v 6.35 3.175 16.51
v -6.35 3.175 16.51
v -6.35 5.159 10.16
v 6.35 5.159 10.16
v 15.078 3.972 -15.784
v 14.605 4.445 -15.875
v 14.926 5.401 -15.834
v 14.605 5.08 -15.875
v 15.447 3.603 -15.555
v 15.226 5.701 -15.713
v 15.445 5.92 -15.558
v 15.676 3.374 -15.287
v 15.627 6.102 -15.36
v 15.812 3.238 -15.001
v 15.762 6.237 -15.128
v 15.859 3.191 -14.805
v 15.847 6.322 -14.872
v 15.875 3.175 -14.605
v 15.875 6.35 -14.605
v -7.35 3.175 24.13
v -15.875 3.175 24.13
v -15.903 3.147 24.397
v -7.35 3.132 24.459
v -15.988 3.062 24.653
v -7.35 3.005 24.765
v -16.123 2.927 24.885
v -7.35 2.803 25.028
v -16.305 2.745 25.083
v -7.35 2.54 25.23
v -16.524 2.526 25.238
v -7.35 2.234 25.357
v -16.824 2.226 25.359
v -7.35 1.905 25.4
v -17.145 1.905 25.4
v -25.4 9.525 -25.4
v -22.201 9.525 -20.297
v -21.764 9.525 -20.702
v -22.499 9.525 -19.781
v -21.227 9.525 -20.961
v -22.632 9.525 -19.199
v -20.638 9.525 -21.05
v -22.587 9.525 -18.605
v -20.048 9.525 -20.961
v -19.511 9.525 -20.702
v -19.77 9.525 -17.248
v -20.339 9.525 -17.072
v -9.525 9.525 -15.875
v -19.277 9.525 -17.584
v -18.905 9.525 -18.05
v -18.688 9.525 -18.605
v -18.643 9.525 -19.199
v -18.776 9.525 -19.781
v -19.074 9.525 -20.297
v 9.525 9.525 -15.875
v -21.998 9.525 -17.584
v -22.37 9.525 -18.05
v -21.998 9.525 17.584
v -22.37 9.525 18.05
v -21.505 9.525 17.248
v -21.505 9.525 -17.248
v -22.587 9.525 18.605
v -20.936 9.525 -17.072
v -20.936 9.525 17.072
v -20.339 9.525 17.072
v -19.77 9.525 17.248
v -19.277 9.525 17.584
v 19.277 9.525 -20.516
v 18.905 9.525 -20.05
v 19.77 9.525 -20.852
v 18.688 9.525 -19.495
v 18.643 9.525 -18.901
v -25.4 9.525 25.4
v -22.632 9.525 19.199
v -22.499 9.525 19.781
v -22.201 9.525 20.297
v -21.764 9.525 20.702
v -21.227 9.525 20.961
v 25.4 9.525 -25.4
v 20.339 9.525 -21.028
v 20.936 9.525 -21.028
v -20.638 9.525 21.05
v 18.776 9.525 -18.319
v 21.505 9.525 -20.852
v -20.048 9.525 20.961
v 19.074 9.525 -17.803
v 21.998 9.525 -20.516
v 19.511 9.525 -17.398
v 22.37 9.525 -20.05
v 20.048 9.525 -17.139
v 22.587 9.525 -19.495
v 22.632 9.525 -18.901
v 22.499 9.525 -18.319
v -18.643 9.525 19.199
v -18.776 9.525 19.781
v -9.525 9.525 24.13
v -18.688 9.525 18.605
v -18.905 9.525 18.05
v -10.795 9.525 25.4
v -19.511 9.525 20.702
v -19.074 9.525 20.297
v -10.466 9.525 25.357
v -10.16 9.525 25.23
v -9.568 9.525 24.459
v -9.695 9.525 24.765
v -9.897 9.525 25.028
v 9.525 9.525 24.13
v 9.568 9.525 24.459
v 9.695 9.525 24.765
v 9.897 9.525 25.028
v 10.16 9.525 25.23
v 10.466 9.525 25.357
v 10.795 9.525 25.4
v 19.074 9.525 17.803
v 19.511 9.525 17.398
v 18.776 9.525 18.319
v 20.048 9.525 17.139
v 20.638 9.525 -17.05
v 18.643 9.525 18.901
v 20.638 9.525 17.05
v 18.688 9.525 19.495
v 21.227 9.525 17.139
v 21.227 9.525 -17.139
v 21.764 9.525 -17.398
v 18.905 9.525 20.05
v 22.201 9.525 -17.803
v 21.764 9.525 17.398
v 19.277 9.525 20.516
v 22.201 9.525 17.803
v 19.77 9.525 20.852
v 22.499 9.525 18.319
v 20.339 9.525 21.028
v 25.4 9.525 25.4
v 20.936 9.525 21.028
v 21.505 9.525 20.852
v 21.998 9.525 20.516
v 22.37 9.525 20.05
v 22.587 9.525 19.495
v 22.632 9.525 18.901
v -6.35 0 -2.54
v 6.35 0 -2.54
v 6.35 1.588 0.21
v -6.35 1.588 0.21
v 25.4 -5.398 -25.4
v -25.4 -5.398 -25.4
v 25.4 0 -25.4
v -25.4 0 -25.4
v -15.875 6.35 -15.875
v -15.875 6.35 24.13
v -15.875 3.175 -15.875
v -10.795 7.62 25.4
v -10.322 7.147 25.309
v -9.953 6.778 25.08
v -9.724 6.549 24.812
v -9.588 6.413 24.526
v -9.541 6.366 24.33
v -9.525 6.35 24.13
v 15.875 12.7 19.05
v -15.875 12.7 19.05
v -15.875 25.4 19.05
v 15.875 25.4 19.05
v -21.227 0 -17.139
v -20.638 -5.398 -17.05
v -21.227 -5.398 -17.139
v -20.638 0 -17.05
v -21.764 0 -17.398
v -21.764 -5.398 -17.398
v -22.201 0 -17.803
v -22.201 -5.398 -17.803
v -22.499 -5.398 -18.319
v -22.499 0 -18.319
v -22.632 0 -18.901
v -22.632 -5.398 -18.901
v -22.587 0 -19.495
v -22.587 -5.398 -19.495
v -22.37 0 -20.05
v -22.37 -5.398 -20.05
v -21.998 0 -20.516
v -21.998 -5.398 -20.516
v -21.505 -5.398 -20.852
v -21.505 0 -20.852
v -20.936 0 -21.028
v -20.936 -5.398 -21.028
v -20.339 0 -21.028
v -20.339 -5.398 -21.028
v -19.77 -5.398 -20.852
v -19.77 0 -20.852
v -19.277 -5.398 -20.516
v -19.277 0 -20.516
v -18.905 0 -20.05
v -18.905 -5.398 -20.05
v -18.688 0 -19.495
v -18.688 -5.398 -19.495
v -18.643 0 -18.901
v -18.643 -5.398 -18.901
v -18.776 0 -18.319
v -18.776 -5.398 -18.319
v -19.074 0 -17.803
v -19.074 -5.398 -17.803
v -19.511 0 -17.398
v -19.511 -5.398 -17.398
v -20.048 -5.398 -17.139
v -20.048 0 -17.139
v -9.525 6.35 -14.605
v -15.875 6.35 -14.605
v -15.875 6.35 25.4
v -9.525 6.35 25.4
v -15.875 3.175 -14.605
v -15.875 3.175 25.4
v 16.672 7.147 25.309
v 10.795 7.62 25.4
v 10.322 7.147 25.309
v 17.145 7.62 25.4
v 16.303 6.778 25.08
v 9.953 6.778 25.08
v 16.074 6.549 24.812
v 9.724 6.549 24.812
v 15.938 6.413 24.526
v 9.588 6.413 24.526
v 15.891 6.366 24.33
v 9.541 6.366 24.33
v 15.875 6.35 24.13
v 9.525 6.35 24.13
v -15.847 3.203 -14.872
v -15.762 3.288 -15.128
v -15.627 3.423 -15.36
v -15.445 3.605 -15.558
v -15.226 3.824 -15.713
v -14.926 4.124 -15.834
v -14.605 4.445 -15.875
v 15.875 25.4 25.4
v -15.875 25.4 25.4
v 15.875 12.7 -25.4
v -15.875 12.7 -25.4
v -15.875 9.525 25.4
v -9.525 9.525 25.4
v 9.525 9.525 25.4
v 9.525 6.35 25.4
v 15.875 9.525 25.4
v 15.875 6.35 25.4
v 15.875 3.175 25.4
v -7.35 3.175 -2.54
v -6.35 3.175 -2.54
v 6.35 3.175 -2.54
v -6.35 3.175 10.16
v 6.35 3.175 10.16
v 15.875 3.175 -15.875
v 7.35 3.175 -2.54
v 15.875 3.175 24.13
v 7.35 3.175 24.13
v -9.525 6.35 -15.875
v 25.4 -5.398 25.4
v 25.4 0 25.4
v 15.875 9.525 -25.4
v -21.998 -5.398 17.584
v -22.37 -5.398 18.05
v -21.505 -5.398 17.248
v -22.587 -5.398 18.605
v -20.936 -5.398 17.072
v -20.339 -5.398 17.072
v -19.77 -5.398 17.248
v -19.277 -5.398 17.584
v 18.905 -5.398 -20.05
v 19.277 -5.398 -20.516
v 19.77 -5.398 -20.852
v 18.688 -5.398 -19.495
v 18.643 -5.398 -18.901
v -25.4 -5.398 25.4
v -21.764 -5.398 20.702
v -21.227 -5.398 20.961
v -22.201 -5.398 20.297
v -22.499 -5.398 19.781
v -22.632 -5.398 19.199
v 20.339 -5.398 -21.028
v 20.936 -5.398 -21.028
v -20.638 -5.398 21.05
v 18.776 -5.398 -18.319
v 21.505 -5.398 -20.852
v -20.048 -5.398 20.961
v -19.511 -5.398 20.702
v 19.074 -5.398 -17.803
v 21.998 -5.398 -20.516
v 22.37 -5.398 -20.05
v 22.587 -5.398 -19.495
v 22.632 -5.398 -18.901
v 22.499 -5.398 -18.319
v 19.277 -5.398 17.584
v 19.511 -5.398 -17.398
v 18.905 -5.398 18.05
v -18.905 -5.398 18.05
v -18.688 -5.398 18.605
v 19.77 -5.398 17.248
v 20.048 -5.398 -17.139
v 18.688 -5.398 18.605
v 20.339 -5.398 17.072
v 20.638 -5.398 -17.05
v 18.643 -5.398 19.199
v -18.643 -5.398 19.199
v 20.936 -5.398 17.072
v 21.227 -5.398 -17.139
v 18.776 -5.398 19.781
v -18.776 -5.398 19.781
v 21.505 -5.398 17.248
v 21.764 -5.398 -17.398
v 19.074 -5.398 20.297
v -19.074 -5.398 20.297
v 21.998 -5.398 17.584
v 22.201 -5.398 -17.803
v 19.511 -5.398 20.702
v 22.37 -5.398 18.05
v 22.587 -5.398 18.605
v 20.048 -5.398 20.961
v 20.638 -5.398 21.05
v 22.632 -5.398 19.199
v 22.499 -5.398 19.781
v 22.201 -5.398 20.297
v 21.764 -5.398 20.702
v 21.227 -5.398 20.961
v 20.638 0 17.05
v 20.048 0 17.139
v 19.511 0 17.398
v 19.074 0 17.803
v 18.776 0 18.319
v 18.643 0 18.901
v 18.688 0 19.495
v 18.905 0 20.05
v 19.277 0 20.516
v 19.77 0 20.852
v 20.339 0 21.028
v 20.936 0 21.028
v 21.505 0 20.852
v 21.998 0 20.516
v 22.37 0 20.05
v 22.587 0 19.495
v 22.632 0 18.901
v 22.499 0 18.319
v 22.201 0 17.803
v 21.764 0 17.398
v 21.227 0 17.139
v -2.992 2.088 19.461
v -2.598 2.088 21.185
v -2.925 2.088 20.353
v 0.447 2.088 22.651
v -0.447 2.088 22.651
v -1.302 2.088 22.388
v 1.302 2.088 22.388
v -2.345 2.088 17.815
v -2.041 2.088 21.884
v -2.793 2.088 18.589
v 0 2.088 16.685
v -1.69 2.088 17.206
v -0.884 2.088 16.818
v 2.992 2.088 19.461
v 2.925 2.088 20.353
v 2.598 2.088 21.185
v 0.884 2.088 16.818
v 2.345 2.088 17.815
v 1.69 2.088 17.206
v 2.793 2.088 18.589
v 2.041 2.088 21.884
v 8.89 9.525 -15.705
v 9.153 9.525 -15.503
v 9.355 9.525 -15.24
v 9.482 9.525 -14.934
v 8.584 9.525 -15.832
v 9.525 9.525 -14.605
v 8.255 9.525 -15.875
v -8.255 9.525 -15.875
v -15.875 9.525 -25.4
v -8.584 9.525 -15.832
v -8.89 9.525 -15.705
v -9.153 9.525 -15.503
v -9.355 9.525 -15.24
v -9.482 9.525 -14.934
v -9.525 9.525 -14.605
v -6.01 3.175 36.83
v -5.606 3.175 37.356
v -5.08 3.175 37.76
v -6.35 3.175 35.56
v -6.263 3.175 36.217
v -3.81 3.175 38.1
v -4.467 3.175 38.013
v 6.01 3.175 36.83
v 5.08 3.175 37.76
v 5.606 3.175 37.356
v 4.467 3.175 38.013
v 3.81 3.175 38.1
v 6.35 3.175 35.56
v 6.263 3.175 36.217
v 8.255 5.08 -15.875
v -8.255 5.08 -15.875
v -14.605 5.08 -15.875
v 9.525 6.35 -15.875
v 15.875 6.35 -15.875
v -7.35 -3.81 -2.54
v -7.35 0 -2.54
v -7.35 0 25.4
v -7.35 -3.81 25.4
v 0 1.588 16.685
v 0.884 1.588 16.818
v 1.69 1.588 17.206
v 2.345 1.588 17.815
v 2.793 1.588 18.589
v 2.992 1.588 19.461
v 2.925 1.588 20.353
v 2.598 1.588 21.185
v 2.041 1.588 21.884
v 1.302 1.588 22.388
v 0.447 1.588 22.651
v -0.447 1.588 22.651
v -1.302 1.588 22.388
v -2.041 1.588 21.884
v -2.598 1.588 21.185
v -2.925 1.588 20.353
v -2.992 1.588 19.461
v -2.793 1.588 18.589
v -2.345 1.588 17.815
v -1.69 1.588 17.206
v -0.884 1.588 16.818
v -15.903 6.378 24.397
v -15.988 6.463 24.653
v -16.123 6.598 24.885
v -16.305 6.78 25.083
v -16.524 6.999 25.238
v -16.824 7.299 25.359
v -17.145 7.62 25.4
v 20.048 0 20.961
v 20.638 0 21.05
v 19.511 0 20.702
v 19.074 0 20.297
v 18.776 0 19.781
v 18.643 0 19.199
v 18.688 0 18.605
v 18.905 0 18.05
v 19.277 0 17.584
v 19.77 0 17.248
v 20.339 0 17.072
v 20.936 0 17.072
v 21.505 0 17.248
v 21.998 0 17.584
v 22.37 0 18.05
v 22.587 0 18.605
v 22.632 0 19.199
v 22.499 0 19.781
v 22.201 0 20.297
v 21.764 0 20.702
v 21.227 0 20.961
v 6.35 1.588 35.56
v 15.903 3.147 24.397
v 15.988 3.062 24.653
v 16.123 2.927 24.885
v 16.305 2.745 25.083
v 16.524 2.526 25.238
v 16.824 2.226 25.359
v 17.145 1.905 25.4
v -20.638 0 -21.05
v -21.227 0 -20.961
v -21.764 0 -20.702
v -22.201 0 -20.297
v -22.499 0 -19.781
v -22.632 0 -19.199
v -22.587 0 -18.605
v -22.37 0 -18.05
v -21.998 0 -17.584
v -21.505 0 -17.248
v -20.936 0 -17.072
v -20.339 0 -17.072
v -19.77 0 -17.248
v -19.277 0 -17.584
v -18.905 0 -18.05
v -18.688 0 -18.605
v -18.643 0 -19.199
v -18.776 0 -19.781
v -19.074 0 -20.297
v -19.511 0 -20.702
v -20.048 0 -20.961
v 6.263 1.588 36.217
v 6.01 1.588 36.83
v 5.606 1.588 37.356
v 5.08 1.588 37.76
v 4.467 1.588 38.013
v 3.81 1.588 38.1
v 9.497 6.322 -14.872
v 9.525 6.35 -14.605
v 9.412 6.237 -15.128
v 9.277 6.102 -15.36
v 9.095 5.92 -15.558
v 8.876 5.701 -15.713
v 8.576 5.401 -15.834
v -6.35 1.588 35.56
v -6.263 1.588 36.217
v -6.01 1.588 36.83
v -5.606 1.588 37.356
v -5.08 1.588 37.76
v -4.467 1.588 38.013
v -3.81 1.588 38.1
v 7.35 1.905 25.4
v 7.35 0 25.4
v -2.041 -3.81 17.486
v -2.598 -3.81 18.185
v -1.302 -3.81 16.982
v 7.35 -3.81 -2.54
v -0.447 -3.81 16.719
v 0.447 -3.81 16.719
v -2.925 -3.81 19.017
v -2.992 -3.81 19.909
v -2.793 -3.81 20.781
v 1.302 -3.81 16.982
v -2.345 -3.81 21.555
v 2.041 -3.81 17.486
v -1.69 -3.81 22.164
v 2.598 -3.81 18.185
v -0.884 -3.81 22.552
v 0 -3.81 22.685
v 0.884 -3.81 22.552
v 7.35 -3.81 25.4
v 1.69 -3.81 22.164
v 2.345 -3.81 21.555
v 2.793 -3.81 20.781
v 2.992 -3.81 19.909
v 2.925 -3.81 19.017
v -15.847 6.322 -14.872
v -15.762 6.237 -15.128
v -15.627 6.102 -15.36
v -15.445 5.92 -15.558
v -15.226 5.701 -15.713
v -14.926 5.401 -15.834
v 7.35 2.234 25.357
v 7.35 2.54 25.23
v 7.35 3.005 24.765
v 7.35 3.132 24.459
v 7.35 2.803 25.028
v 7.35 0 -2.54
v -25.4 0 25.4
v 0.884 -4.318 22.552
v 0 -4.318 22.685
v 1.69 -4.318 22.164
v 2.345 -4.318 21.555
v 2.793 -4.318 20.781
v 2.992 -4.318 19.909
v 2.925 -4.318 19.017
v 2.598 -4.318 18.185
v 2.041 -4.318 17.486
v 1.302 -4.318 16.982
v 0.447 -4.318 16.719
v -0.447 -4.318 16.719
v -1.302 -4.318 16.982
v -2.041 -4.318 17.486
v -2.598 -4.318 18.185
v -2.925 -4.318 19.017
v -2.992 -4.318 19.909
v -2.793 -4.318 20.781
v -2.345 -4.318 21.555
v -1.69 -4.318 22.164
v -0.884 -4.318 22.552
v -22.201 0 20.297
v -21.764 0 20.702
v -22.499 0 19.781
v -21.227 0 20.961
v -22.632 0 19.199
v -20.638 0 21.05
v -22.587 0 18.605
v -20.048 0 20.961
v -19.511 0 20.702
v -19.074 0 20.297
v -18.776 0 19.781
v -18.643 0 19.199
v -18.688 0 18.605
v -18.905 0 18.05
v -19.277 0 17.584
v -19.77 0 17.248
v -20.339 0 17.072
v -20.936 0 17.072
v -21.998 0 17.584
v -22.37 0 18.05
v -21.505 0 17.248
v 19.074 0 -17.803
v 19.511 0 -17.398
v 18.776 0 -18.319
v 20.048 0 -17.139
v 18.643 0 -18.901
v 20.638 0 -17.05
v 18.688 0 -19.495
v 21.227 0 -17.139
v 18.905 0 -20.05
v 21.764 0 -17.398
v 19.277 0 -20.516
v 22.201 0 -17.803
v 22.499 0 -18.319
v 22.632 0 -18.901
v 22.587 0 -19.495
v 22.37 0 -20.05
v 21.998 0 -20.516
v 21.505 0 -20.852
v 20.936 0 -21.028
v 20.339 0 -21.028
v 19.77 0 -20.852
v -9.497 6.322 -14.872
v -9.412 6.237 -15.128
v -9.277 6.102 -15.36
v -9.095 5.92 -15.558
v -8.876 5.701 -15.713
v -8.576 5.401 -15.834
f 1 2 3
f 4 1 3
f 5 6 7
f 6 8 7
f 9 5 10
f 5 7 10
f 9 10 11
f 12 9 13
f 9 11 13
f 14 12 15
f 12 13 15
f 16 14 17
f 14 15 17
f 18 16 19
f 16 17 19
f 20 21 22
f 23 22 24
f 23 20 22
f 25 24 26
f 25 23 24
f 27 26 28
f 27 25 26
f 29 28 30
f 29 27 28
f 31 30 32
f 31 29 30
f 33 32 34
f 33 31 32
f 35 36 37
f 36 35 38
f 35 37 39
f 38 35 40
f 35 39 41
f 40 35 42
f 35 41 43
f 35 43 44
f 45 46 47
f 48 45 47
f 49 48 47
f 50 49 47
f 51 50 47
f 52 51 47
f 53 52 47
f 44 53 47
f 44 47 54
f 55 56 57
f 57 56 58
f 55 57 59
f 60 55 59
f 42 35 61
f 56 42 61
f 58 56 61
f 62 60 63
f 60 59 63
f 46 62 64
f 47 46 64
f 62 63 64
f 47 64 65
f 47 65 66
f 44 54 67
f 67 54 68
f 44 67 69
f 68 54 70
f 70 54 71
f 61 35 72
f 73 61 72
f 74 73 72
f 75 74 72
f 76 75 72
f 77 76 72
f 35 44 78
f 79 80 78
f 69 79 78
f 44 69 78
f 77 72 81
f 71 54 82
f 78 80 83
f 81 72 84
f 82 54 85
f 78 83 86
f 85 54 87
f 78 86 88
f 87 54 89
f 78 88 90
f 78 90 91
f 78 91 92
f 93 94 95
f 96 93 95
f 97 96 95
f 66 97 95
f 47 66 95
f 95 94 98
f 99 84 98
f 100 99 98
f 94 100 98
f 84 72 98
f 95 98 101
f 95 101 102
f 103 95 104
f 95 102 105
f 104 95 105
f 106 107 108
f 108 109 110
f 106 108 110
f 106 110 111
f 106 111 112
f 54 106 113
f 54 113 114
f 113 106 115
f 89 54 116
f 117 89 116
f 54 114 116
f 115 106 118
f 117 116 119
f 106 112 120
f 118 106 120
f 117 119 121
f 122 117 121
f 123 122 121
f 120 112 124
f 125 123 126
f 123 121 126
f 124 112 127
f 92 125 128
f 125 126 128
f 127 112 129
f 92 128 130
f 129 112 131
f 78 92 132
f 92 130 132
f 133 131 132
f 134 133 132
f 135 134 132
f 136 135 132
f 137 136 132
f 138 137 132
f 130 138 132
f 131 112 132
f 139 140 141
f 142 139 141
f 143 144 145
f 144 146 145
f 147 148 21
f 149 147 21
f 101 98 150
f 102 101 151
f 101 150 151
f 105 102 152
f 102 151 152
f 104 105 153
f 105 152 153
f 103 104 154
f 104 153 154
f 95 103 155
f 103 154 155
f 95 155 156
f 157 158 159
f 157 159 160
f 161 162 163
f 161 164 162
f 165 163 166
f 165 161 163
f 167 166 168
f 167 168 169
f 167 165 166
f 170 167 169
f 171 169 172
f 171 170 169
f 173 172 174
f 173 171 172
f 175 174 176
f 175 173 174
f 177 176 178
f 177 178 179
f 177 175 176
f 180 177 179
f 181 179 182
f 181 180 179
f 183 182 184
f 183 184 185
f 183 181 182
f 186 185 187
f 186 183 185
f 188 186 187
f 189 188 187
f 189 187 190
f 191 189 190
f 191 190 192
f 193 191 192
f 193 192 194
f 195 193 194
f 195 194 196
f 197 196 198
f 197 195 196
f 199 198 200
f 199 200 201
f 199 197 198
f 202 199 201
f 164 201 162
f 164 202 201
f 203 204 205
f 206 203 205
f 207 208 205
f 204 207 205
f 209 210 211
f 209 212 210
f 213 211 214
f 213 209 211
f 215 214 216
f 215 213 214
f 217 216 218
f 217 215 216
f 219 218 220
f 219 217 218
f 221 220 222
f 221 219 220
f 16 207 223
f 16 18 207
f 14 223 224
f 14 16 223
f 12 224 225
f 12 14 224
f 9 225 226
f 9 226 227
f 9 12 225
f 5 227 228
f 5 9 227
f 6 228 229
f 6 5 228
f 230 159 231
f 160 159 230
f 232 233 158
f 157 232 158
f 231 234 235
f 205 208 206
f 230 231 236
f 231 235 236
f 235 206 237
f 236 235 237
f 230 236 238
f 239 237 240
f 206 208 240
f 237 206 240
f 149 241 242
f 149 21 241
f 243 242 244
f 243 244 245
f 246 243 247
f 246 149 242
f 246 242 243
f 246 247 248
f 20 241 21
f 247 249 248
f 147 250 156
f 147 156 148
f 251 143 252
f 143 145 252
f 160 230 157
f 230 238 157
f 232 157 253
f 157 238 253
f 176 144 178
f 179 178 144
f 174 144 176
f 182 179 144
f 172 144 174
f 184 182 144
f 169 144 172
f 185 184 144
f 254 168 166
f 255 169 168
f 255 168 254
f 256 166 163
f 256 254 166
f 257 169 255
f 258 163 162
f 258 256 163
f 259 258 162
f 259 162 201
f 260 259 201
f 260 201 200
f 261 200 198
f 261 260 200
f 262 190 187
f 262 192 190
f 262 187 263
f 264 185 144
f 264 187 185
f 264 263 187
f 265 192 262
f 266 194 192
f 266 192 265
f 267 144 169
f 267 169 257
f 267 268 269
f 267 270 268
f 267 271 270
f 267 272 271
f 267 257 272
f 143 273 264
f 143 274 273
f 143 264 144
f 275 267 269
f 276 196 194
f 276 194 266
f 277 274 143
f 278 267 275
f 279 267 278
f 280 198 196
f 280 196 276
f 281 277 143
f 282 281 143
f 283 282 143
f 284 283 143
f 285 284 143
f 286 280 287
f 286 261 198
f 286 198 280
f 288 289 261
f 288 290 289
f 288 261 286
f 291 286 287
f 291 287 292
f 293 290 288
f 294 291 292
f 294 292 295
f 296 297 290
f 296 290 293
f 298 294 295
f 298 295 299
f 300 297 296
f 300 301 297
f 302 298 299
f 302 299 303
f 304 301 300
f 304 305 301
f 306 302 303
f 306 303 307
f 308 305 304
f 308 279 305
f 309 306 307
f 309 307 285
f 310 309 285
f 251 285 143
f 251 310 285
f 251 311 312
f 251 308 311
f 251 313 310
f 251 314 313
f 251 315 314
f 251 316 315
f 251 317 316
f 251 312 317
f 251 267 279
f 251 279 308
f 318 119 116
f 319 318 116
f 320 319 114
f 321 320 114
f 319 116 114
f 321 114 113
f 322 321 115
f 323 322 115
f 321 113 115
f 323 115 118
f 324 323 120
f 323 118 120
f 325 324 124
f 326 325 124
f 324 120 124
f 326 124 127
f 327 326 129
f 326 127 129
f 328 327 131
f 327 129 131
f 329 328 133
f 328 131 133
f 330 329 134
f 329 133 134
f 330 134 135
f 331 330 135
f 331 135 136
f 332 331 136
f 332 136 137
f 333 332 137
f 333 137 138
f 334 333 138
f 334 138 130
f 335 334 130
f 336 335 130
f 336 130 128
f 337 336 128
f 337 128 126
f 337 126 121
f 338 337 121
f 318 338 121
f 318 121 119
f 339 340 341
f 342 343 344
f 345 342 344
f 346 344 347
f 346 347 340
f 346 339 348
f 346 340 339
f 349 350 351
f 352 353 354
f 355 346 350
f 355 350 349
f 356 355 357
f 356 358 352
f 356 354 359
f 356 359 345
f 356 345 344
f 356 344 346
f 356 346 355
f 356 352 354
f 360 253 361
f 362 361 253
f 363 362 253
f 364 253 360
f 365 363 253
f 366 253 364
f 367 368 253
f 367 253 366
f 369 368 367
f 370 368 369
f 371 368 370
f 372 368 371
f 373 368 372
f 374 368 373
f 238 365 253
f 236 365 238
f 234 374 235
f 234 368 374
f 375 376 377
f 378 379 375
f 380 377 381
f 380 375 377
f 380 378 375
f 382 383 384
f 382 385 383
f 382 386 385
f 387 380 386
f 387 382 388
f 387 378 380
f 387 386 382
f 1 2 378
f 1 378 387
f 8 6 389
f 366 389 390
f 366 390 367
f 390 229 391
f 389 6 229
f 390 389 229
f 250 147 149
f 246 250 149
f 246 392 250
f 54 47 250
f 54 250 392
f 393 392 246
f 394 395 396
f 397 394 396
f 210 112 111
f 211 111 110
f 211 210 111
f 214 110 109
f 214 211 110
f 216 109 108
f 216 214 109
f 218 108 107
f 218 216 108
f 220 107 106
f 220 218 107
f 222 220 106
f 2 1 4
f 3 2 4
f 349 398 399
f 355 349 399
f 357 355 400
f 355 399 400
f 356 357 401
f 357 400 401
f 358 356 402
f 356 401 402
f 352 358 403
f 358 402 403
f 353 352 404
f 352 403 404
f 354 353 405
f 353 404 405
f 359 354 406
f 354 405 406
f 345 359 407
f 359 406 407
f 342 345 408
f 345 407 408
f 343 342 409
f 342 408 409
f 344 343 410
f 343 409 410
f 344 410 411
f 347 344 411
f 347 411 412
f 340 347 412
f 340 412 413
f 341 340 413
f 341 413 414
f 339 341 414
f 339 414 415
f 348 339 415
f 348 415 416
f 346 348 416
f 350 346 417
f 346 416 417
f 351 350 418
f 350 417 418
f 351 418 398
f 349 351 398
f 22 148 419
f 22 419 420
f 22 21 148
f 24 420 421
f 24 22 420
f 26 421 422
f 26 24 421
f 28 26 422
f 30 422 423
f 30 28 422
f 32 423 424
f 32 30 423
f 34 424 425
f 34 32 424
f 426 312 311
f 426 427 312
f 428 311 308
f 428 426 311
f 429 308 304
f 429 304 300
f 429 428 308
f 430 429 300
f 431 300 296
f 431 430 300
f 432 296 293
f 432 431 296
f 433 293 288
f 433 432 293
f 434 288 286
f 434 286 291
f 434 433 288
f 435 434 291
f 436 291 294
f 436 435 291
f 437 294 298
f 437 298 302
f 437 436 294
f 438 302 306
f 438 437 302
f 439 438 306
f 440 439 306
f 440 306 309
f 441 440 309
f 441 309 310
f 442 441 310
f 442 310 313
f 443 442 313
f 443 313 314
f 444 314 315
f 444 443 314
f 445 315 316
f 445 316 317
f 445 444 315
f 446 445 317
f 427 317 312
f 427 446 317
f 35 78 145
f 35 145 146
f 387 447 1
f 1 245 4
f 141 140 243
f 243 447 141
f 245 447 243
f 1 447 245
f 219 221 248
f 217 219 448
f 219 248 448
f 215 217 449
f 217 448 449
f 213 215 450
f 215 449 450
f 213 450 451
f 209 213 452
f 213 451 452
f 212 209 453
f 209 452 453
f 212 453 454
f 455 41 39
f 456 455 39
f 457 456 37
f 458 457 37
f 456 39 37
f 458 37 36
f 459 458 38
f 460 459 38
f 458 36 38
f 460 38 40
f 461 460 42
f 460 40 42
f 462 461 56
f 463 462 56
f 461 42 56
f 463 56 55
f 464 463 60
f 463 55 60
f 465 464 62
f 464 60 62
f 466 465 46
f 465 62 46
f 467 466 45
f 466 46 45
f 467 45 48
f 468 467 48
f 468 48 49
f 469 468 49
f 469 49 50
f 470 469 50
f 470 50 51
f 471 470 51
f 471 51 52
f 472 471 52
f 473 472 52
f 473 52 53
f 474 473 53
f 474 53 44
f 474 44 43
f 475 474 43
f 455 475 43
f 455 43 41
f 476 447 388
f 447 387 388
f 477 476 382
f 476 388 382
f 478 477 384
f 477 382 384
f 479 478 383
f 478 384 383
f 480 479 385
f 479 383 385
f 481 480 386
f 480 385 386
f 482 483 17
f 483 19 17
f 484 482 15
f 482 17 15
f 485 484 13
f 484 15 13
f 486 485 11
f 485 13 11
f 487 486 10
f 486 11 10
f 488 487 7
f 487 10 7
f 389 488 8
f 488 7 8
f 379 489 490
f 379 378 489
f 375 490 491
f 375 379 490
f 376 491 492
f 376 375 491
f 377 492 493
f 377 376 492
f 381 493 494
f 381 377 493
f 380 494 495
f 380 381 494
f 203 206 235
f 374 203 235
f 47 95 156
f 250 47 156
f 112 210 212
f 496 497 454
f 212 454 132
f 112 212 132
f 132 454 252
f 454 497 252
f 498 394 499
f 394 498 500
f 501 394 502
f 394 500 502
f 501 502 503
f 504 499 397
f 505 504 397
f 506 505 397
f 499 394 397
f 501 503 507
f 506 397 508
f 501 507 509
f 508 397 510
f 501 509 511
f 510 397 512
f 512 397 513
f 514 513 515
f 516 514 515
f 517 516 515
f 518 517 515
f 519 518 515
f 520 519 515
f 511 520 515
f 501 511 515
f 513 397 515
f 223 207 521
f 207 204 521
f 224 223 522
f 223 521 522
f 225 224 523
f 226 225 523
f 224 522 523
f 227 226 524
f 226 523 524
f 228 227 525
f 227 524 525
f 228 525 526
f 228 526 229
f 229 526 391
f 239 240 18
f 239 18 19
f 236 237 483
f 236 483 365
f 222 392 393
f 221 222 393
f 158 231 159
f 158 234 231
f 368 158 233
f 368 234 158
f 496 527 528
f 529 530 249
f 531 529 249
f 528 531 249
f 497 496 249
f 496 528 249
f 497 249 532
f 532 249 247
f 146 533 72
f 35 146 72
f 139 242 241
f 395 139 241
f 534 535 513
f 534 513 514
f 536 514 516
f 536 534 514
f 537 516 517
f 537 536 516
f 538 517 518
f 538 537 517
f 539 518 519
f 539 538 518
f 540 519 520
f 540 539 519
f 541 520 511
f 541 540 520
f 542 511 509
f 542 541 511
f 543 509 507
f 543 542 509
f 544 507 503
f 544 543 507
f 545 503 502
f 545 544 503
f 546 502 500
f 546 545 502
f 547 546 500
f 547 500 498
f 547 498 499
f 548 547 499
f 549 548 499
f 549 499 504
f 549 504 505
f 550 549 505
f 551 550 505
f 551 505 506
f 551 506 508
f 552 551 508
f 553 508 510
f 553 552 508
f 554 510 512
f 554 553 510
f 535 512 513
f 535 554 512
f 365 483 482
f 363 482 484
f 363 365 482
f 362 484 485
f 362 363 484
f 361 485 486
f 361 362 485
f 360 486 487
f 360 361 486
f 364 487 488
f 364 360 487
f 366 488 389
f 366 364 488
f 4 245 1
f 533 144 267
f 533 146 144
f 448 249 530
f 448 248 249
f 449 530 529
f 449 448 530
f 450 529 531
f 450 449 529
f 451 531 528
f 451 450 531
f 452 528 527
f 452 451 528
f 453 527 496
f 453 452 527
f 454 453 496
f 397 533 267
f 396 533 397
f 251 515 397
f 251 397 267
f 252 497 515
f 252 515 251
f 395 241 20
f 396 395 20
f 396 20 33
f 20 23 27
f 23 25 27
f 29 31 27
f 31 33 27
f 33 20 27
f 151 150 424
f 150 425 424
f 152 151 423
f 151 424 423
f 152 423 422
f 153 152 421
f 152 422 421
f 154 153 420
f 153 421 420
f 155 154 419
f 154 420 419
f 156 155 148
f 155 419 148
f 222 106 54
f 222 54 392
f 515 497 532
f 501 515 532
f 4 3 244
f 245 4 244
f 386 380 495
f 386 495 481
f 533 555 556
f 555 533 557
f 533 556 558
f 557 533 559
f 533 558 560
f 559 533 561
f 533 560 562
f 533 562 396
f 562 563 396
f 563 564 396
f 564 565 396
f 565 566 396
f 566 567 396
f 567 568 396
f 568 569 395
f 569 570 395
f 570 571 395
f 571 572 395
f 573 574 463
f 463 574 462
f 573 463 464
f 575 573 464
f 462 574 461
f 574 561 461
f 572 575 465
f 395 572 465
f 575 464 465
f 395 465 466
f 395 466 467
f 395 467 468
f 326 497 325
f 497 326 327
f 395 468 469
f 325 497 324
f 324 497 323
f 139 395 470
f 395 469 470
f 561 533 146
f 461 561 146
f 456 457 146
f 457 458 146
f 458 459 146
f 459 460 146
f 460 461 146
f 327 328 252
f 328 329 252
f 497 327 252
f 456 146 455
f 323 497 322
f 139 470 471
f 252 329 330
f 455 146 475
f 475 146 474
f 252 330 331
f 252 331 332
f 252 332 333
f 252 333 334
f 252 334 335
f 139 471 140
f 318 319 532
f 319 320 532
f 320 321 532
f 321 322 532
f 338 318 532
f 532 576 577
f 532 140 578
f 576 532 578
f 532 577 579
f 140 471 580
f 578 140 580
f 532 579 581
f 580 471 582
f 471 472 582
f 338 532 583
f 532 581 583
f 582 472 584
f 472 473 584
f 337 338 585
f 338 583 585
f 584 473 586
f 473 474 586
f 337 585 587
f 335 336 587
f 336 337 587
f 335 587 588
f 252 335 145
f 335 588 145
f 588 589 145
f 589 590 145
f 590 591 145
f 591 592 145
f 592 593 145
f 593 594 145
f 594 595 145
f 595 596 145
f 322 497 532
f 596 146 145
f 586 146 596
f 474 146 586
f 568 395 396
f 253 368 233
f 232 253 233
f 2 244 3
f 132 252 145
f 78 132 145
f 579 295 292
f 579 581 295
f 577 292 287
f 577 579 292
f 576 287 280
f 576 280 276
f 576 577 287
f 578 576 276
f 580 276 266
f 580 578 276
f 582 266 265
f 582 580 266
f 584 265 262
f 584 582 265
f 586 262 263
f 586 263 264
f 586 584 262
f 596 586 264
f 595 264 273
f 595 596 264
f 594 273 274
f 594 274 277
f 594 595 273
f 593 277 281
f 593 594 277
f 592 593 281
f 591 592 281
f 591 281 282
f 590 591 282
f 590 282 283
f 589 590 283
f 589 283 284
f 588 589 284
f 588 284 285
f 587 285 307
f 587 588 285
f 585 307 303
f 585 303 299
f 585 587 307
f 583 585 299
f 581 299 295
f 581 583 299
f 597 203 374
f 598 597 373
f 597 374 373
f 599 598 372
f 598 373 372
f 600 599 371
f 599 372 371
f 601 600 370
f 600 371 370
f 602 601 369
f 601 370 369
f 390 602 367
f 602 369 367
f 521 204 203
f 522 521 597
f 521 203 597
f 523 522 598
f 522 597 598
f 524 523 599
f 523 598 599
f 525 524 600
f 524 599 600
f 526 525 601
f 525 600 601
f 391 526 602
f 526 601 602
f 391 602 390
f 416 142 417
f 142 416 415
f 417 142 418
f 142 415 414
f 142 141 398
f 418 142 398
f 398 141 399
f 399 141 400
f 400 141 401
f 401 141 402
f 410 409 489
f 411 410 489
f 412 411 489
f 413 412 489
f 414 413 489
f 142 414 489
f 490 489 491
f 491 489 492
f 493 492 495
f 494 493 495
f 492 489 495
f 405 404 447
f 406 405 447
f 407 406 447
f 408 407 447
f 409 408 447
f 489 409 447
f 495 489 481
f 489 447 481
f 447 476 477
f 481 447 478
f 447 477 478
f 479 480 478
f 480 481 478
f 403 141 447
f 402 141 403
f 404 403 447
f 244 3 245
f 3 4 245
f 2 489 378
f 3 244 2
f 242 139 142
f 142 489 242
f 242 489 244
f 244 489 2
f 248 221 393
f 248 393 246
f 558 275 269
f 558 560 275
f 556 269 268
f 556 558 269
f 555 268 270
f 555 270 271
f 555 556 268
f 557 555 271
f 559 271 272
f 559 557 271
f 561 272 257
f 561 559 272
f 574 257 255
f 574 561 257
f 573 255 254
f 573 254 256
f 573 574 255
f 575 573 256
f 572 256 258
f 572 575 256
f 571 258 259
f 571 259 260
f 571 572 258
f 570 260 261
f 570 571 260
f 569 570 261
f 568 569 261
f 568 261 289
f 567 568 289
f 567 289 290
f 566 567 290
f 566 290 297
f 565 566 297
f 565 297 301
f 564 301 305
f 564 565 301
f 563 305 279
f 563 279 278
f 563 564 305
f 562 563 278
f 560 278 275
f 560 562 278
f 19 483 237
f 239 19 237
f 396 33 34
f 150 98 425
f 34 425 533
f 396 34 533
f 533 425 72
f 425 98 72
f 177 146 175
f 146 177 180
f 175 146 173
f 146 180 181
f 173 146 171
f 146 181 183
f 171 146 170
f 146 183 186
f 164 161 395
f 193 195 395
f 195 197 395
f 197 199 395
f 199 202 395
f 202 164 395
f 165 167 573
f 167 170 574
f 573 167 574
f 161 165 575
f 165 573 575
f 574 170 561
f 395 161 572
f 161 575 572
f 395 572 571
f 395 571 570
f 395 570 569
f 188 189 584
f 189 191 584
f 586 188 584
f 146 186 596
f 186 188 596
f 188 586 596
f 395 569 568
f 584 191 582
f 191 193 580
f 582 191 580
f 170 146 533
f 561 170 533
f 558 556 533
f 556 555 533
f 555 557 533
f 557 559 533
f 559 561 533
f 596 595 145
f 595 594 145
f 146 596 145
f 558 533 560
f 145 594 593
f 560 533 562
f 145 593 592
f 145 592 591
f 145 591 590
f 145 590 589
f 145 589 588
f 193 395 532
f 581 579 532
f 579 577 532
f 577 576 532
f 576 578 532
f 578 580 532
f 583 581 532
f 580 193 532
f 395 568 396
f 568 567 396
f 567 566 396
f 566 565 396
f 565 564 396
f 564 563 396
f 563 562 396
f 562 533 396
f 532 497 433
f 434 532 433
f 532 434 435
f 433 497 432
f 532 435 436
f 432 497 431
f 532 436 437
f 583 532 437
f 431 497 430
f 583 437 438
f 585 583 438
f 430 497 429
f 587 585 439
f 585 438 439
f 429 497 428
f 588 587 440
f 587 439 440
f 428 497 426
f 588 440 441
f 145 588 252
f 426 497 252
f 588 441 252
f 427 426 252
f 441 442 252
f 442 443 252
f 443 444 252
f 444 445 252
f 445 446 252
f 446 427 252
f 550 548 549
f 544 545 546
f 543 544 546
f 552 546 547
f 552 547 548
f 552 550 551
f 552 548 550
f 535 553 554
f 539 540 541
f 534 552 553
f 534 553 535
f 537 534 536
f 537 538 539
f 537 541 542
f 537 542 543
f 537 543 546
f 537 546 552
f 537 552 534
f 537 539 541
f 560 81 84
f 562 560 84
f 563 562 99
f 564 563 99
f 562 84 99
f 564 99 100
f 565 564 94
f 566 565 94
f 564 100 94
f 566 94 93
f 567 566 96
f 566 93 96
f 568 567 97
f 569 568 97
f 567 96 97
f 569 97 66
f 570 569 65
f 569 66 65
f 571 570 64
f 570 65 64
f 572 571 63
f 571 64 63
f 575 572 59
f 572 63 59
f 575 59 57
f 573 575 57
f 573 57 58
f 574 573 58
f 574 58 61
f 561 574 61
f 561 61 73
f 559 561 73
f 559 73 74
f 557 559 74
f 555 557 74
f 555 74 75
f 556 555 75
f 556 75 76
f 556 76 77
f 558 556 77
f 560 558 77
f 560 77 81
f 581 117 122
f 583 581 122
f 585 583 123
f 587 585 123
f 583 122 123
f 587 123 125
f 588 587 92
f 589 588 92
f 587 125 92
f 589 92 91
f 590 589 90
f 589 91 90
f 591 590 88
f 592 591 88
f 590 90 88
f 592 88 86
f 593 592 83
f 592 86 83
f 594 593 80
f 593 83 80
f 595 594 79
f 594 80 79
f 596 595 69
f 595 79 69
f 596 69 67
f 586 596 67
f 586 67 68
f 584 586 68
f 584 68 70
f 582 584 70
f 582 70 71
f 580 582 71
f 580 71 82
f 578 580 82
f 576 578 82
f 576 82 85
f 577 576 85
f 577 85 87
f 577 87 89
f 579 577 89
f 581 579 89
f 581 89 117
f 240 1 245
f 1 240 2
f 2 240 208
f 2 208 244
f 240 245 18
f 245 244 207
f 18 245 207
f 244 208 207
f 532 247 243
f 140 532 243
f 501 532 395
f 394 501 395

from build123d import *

# Parameters (mm, degrees)
SKETCH1_W               = 50.8
SKETCH1_H               = 50.8
BOSS_EXTRUDE1_DEPTH     = 3.175
BOSS_EXTRUDE5_DEPTH     = 6.35
CUT_EXTRUDE4_DEPTH      = 37.061067996
SKETCH19_W              = 12.7
SKETCH19_H              = 3.175
BOSS_EXTRUDE10_DEPTH    = 12.7
BOSS_EXTRUDE2_DEPTH     = 50.8
BOSS_EXTRUDE6_REACH     = 48.771
SKETCH10_W              = 50.8
SKETCH10_H              = 9.525
SKETCH12_R              = 2
CUT_EXTRUDE2_DEPTH      = 47.770670564
CUT_EXTRUDE5_DEPTH      = 12.7
SKETCH21_R              = 3
CUT_EXTRUDE6_DEPTH      = 0.5
FILLET2_R               = 2.54
BOSS_EXTRUDE11_DEPTH    = 6.35
SKETCH23_W              = 31.75
SKETCH23_H              = 50.8
BOSS_EXTRUDE12_DEPTH    = 3.175
INTERSECT6_START        = -15.875
INTERSECT6_OUTLINE_W    = 3.175
INTERSECT6_OUTLINE_H    = 50.8
INTERSECT6_DEPTH        = 31.75
INTERSECT6_START_2      = -9.525
INTERSECT6_2_OUTLINE_W  = 3.175
INTERSECT6_2_OUTLINE_H  = 41.275
INTERSECT6_2_DEPTH      = 19.05
INTERSECT6_3_DEPTH      = 9.525
INTERSECT6_START_3      = 6.35
INTERSECT6_4_DEPTH      = 9.525
INTERSECT6_5_OUTLINE_R  = 2
INTERSECT6_5_DEPTH      = 9.525
INTERSECT6_START_4      = 1.5875
INTERSECT6_6_OUTLINE_R  = 3
INTERSECT6_6_DEPTH      = 1.5875
INTERSECT6_START_5      = 2.0875
INTERSECT6_7_OUTLINE_R  = 3
INTERSECT6_7_DEPTH      = 1.0875
INTERSECT6_8_OUTLINE_W  = 1.5875
INTERSECT6_8_OUTLINE_H  = 13.335
INTERSECT6_8_DEPTH      = 31.75
INTERSECT6_9_OUTLINE_W  = 1.5875
INTERSECT6_9_OUTLINE_H  = 27.94
INTERSECT6_9_DEPTH      = 8.525
INTERSECT6_START_6      = 7.35
INTERSECT6_10_OUTLINE_W = 1.5875
INTERSECT6_10_OUTLINE_H = 27.94
INTERSECT6_10_DEPTH     = 8.525
INTERSECT6_START_7      = -6.35
INTERSECT6_11_DEPTH     = 12.7
SKETCH24_R              = 2
BOSS_EXTRUDE13_DEPTH    = 3.81
SKETCH26_W              = 50.8
SKETCH26_H              = 50.8
SKETCH26_R              = 2
BOSS_EXTRUDE15_DEPTH    = 1.5875
CUT_EXTRUDE7_START      = -0.508
SKETCH27_R              = 3
CUT_EXTRUDE7_DEPTH      = 0.508
FILLET3_R               = 1.27
FILLET4_R               = 1.27
SKETCH28_W              = 31.75
SKETCH28_H              = 6.35
BOSS_EXTRUDE16_DEPTH    = 12.7


with BuildPart() as part:
    # Sketch1 → Boss-Extrude1 (new body)
    with BuildSketch(Plane(origin=(0, 0, 0), x_dir=(1, 0, 0), z_dir=(0, 1, 0))):
        Rectangle(SKETCH1_W, SKETCH1_H)
    extrude(amount=BOSS_EXTRUDE1_DEPTH)

    # Sketch7 → Boss-Extrude5 (add, symmetric)
    with BuildSketch(Plane(origin=(0, 0, 0), x_dir=(0, 0, -1), z_dir=(1, 0, 0))):
        Polygon((-16.51, 3.175), (-10.16, 5.159375), (-10.16, 3.175), align=None)
    extrude(amount=BOSS_EXTRUDE5_DEPTH, both=True)

    # Sketch18 → Cut-Extrude4 (cut, through all)
    with BuildSketch(Plane(origin=(0, 3.175, 0), x_dir=(1, 0, 0), z_dir=(0, 1, 0))):
        Polygon((7.35, -17.51), (7.35, -10.16), (7.35, 2.54), (6.35, 2.54), (6.35, -10.16), (6.35, -16.51), (6.35, -25.4), (-6.35, -25.4), (-6.35, -16.51), (-6.35, -10.16), (-6.35, 2.54), (-7.35, 2.54), (-7.35, -10.16), (-7.35, -17.51), (-7.35, -29.229001294), (7.35, -29.229001294), align=None)
    extrude(amount=-CUT_EXTRUDE4_DEPTH, mode=Mode.SUBTRACT)

    # Sketch19 → Boss-Extrude10 (add)
    with BuildSketch(Plane.XY.offset(25.4)):
        with Locations((0, 1.5875)):
            Rectangle(SKETCH19_W, SKETCH19_H)
    extrude(amount=BOSS_EXTRUDE10_DEPTH)

    # Sketch3 → Boss-Extrude2 (add)
    with BuildSketch(Plane.XY.offset(25.4)):
        Polygon((-15.875, 3.175), (-25.4, 3.175), (-25.4, 9.525), (-9.525, 9.525), (-9.525, 6.35), (-15.875, 6.35), align=None)
        Polygon((9.525, 6.35), (15.875, 6.35), (15.875, 3.175), (25.4, 3.175), (25.4, 9.525), (9.525, 9.525), align=None)
    extrude(amount=-BOSS_EXTRUDE2_DEPTH)

    # Boss-Extrude6: up to this face of the body (flat: up to its plane)
    boss_extrude6_end = Plane(part.part.faces().sort_by_distance((0, 3.175, -2.992354694))[0])
    # Sketch10 → Boss-Extrude6 (add, up to the picked face)
    with BuildSketch(Plane(origin=(0, 9.525, 0), x_dir=(1, 0, 0), z_dir=(0, 1, 0)), mode=Mode.PRIVATE) as boss_extrude6_sk1:
        with Locations((0, 20.6375)):
            Rectangle(SKETCH10_W, SKETCH10_H)
    boss_extrude6_tool1 = split(extrude(boss_extrude6_sk1.sketch, amount=-BOSS_EXTRUDE6_REACH, mode=Mode.PRIVATE), bisect_by=boss_extrude6_end, keep=Keep.BOTH, mode=Mode.PRIVATE)
    add(boss_extrude6_tool1.solids().sort_by(Axis((0, 9.525, -20.6375), (0, -1, 0)))[0])

    # Sketch12 → Cut-Extrude2 (cut, through all)
    with BuildSketch(Plane(origin=(0, 9.525, 0), x_dir=(1, 0, 0), z_dir=(0, 1, 0))):
        with Locations(Location((-20.6375, -19.05, 0), (0, 0, 270))):
            Circle(SKETCH12_R)
        with Locations(Location((20.6375, -19.05, 0), (0, 0, 90))):
            Circle(SKETCH12_R)
        with Locations(Location((20.6375, 19.05, 0), (0, 0, 270))):
            Circle(SKETCH12_R)
        with Locations(Location((-20.6375, 19.05, 0), (0, 0, 90))):
            Circle(SKETCH12_R)
    extrude(amount=-CUT_EXTRUDE2_DEPTH, mode=Mode.SUBTRACT)

    # Sketch20 → Cut-Extrude5 (cut)
    with BuildSketch(Plane(origin=(6.35, 0, 0), x_dir=(0, 0, -1), z_dir=(1, 0, 0))):
        Polygon((2.54, 0), (-0.209630657, 1.5875), (-38.1, 1.5875), (-38.1, 0), align=None)
    extrude(amount=-CUT_EXTRUDE5_DEPTH, mode=Mode.SUBTRACT)

    # Sketch21 → Cut-Extrude6 (cut)
    with BuildSketch(Plane.XZ.offset(-1.5875)):
        with Locations(Location((0, 19.685, 0), (0, 0, 270))):
            Circle(SKETCH21_R)
    extrude(amount=-CUT_EXTRUDE6_DEPTH, mode=Mode.SUBTRACT)

    # Fillet2
    fillet2_edges = [part.edges().sort_by_distance(p)[0] for p in [
        (6.35, 2.38125, 38.1),
        (-6.35, 2.38125, 38.1),
    ]]
    fillet(fillet2_edges, radius=FILLET2_R)

    # Fillet3
    fillet3_edges = [part.edges().sort_by_distance(p)[0] for p in [
        (9.525, 7.9375, 25.4),
        (12.7, 6.35, 25.4),
        (15.875, 4.7625, 25.4),
        (11.6125, 3.175, 25.4),
        (-11.6125, 3.175, 25.4),
        (-15.875, 4.7625, 25.4),
        (-12.7, 6.35, 25.4),
        (-9.525, 7.9375, 25.4),
    ]]
    fillet(fillet3_edges, radius=FILLET3_R)


with BuildPart() as body_2:
    # Sketch22 → Boss-Extrude11 (new body)
    with BuildSketch(Plane(origin=(0, 3.175, 0), x_dir=(1, 0, 0), z_dir=(0, 1, 0))):
        Polygon((-7.35, -25.4), (7.35, -25.4), (15.875, -25.4), (15.875, 15.875), (-15.875, 15.875), (-15.875, -25.4), align=None)
    extrude(amount=BOSS_EXTRUDE11_DEPTH)

    # Sketch23 → Boss-Extrude12 (add)
    with BuildSketch(Plane(origin=(0, 9.525, 0), x_dir=(1, 0, 0), z_dir=(0, 1, 0))):
        Rectangle(SKETCH23_W, SKETCH23_H)
    extrude(amount=BOSS_EXTRUDE12_DEPTH)


with BuildPart() as body_3:
    # Intersect6: read off the stored shape, not the designer's step
    # Intersect6 outline → Intersect6 (new body)
    with BuildSketch(Plane.YZ.offset(INTERSECT6_START)):
        Polygon((3.175, 10.16), (3.175, -15.875), (6.35, -15.875), (6.35, 25.4), (3.175, 25.4), (3.175, 16.51), (5.159375, 10.16), align=None)
        with Locations((11.1125, 0)):
            Rectangle(INTERSECT6_OUTLINE_W, INTERSECT6_OUTLINE_H)
    extrude(amount=INTERSECT6_DEPTH)

    # Intersect6 2 outline → Intersect6 2 (add)
    with BuildSketch(Plane.YZ.offset(INTERSECT6_START_2)):
        with Locations((7.9375, 4.7625)):
            Rectangle(INTERSECT6_2_OUTLINE_W, INTERSECT6_2_OUTLINE_H)
    extrude(amount=INTERSECT6_2_DEPTH)

    # Intersect6 3 outline → Intersect6 3 (add)
    with BuildSketch(Plane.YZ.offset(INTERSECT6_START)):
        Polygon((3.175, 16.51), (3.175, 10.16), (5.159375, 10.16), align=None)
    extrude(amount=INTERSECT6_3_DEPTH)

    # Intersect6 4 outline → Intersect6 4 (add)
    with BuildSketch(Plane.YZ.offset(INTERSECT6_START_3)):
        Polygon((3.175, 16.51), (3.175, 10.16), (5.159375, 10.16), align=None)
    extrude(amount=INTERSECT6_4_DEPTH)

    # Fillet4
    fillet4_edges = [body_3.edges().sort_by_distance(p)[0] for p in [
        (12.7, 6.35, -15.875),
        (-15.875, 4.7625, -15.875),
        (-9.525, 7.9375, -15.875),
        (-12.7, 6.35, -15.875),
        (9.525, 7.9375, -15.875),
        (15.875, 4.7625, -15.875),
        (0, 3.175, -15.875),
    ]]
    fillet(fillet4_edges, radius=FILLET4_R)

    # Sketch28 → Boss-Extrude16 (add)
    with BuildSketch(Plane(origin=(0, 12.7, 0), x_dir=(1, 0, 0), z_dir=(0, 1, 0))):
        with Locations((0, -22.225)):
            Rectangle(SKETCH28_W, SKETCH28_H)
    extrude(amount=BOSS_EXTRUDE16_DEPTH)


with BuildPart() as body_4:
    # Intersect6 5 outline → Intersect6 5 (new body)
    with BuildSketch(Plane(origin=(0, 0, 0), x_dir=(1, 0, 0), z_dir=(0, 1, 0))):
        Polygon((-15.875, 15.875), (15.875, 15.875), (15.875, -25.4), (25.4, -25.4), (25.4, 25.4), (-25.4, 25.4), (-25.4, -25.4), (-15.875, -25.4), align=None)
        with Locations((-20.6375, -19.05)):
            Circle(INTERSECT6_5_OUTLINE_R, mode=Mode.SUBTRACT)
        with Locations((20.6375, -19.05)):
            Circle(INTERSECT6_5_OUTLINE_R, mode=Mode.SUBTRACT)
        with Locations((-20.6375, 19.05)):
            Circle(INTERSECT6_5_OUTLINE_R, mode=Mode.SUBTRACT)
        with Locations((20.6375, 19.05)):
            Circle(INTERSECT6_5_OUTLINE_R, mode=Mode.SUBTRACT)
    extrude(amount=INTERSECT6_5_DEPTH)

    # Intersect6 6 outline → Intersect6 6 (add)
    with BuildSketch(Plane(origin=(0, 0, 0), x_dir=(1, 0, 0), z_dir=(0, 1, 0)).offset(INTERSECT6_START_4)):
        with BuildLine():
            Line((15.875, -25.4), (15.875, 15.875))
            Line((15.875, 15.875), (-15.875, 15.875))
            Line((-15.875, 15.875), (-15.875, -25.4))
            Line((-15.875, -25.4), (-7.35, -25.4))
            Line((-7.35, -25.4), (-7.35, 2.54))
            Line((-7.35, 2.54), (-6.35, 2.54))
            Line((-6.35, 2.54), (-6.35, -35.56))
            ThreePointArc((-6.35, -35.56), (-5.606051224, -37.356051224), (-3.81, -38.1))
            Line((-3.81, -38.1), (3.81, -38.1))
            ThreePointArc((3.81, -38.1), (5.606051224, -37.356051224), (6.35, -35.56))
            Line((6.35, -35.56), (6.35, 2.54))
            Line((6.35, 2.54), (7.35, 2.54))
            Line((7.35, 2.54), (7.35, -25.4))
            Line((7.35, -25.4), (15.875, -25.4))
        make_face()
        with Locations((0, -19.685)):
            Circle(INTERSECT6_6_OUTLINE_R, mode=Mode.SUBTRACT)
    extrude(amount=INTERSECT6_6_DEPTH)

    # Intersect6 7 outline → Intersect6 7 (add)
    with BuildSketch(Plane(origin=(0, 0, 0), x_dir=(1, 0, 0), z_dir=(0, 1, 0)).offset(INTERSECT6_START_5)):
        with Locations((0, -19.685)):
            Circle(INTERSECT6_7_OUTLINE_R)
    extrude(amount=INTERSECT6_7_DEPTH)

    # Intersect6 8 outline → Intersect6 8 (add)
    with BuildSketch(Plane.YZ.offset(INTERSECT6_START)):
        with Locations((0.79375, -9.2075)):
            Rectangle(INTERSECT6_8_OUTLINE_W, INTERSECT6_8_OUTLINE_H)
    extrude(amount=INTERSECT6_8_DEPTH)

    # Intersect6 9 outline → Intersect6 9 (add)
    with BuildSketch(Plane.YZ.offset(INTERSECT6_START)):
        with Locations((0.79375, 11.43)):
            Rectangle(INTERSECT6_9_OUTLINE_W, INTERSECT6_9_OUTLINE_H)
    extrude(amount=INTERSECT6_9_DEPTH)

    # Intersect6 10 outline → Intersect6 10 (add)
    with BuildSketch(Plane.YZ.offset(INTERSECT6_START_6)):
        with Locations((0.79375, 11.43)):
            Rectangle(INTERSECT6_10_OUTLINE_W, INTERSECT6_10_OUTLINE_H)
    extrude(amount=INTERSECT6_10_DEPTH)

    # Intersect6 11 outline → Intersect6 11 (add)
    with BuildSketch(Plane.YZ.offset(INTERSECT6_START_7)):
        Polygon((1.5875, 0.209630657), (0, -2.54), (1.5875, -2.54), align=None)
    extrude(amount=INTERSECT6_11_DEPTH)


with BuildPart() as body_3_2:
    # Sketch24 → Boss-Extrude13 (new body)
    with BuildSketch(Plane.XZ):
        Polygon((7.35, -2.54), (6.35, -2.54), (-6.35, -2.54), (-7.35, -2.54), (-7.35, 25.4), (-25.4, 25.4), (-25.4, -25.4), (25.4, -25.4), (25.4, 25.4), (7.35, 25.4), align=None)
        with Locations(Location((20.6375, 19.05, 0), (0, 0, 90))):
            Circle(SKETCH24_R, mode=Mode.SUBTRACT)
        with Locations(Location((20.6375, -19.05, 0), (0, 0, 90))):
            Circle(SKETCH24_R, mode=Mode.SUBTRACT)
        with Locations(Location((-20.6375, -19.05, 0), (0, 0, 90))):
            Circle(SKETCH24_R, mode=Mode.SUBTRACT)
        with Locations(Location((-20.6375, 19.05, 0), (0, 0, 90))):
            Circle(SKETCH24_R, mode=Mode.SUBTRACT)
    extrude(amount=BOSS_EXTRUDE13_DEPTH)

    # Sketch26 → Boss-Extrude15 (add)
    with BuildSketch(Plane.XZ.offset(3.81)):
        Rectangle(SKETCH26_W, SKETCH26_H)
        with Locations(Location((-20.6375, -19.05, 0), (0, 0, 90))):
            Circle(SKETCH26_R, mode=Mode.SUBTRACT)
        with Locations(Location((20.6375, -19.05, 0), (0, 0, 90))):
            Circle(SKETCH26_R, mode=Mode.SUBTRACT)
        with Locations(Location((20.6375, 19.05, 0), (0, 0, 90))):
            Circle(SKETCH26_R, mode=Mode.SUBTRACT)
        with Locations(Location((-20.6375, 19.05, 0), (0, 0, 90))):
            Circle(SKETCH26_R, mode=Mode.SUBTRACT)
    extrude(amount=BOSS_EXTRUDE15_DEPTH)

    # Sketch27 → Cut-Extrude7 (cut)
    with BuildSketch(Plane(origin=(0, -3.81, 0), x_dir=(1, 0, 0), z_dir=(0, 1, 0)).offset(CUT_EXTRUDE7_START)):
        with Locations(Location((0, -19.685, 0), (0, 0, 270))):
            Circle(SKETCH27_R)
    extrude(amount=CUT_EXTRUDE7_DEPTH, mode=Mode.SUBTRACT)


solid = Compound([part.part, body_3.part, body_3_2.part])
